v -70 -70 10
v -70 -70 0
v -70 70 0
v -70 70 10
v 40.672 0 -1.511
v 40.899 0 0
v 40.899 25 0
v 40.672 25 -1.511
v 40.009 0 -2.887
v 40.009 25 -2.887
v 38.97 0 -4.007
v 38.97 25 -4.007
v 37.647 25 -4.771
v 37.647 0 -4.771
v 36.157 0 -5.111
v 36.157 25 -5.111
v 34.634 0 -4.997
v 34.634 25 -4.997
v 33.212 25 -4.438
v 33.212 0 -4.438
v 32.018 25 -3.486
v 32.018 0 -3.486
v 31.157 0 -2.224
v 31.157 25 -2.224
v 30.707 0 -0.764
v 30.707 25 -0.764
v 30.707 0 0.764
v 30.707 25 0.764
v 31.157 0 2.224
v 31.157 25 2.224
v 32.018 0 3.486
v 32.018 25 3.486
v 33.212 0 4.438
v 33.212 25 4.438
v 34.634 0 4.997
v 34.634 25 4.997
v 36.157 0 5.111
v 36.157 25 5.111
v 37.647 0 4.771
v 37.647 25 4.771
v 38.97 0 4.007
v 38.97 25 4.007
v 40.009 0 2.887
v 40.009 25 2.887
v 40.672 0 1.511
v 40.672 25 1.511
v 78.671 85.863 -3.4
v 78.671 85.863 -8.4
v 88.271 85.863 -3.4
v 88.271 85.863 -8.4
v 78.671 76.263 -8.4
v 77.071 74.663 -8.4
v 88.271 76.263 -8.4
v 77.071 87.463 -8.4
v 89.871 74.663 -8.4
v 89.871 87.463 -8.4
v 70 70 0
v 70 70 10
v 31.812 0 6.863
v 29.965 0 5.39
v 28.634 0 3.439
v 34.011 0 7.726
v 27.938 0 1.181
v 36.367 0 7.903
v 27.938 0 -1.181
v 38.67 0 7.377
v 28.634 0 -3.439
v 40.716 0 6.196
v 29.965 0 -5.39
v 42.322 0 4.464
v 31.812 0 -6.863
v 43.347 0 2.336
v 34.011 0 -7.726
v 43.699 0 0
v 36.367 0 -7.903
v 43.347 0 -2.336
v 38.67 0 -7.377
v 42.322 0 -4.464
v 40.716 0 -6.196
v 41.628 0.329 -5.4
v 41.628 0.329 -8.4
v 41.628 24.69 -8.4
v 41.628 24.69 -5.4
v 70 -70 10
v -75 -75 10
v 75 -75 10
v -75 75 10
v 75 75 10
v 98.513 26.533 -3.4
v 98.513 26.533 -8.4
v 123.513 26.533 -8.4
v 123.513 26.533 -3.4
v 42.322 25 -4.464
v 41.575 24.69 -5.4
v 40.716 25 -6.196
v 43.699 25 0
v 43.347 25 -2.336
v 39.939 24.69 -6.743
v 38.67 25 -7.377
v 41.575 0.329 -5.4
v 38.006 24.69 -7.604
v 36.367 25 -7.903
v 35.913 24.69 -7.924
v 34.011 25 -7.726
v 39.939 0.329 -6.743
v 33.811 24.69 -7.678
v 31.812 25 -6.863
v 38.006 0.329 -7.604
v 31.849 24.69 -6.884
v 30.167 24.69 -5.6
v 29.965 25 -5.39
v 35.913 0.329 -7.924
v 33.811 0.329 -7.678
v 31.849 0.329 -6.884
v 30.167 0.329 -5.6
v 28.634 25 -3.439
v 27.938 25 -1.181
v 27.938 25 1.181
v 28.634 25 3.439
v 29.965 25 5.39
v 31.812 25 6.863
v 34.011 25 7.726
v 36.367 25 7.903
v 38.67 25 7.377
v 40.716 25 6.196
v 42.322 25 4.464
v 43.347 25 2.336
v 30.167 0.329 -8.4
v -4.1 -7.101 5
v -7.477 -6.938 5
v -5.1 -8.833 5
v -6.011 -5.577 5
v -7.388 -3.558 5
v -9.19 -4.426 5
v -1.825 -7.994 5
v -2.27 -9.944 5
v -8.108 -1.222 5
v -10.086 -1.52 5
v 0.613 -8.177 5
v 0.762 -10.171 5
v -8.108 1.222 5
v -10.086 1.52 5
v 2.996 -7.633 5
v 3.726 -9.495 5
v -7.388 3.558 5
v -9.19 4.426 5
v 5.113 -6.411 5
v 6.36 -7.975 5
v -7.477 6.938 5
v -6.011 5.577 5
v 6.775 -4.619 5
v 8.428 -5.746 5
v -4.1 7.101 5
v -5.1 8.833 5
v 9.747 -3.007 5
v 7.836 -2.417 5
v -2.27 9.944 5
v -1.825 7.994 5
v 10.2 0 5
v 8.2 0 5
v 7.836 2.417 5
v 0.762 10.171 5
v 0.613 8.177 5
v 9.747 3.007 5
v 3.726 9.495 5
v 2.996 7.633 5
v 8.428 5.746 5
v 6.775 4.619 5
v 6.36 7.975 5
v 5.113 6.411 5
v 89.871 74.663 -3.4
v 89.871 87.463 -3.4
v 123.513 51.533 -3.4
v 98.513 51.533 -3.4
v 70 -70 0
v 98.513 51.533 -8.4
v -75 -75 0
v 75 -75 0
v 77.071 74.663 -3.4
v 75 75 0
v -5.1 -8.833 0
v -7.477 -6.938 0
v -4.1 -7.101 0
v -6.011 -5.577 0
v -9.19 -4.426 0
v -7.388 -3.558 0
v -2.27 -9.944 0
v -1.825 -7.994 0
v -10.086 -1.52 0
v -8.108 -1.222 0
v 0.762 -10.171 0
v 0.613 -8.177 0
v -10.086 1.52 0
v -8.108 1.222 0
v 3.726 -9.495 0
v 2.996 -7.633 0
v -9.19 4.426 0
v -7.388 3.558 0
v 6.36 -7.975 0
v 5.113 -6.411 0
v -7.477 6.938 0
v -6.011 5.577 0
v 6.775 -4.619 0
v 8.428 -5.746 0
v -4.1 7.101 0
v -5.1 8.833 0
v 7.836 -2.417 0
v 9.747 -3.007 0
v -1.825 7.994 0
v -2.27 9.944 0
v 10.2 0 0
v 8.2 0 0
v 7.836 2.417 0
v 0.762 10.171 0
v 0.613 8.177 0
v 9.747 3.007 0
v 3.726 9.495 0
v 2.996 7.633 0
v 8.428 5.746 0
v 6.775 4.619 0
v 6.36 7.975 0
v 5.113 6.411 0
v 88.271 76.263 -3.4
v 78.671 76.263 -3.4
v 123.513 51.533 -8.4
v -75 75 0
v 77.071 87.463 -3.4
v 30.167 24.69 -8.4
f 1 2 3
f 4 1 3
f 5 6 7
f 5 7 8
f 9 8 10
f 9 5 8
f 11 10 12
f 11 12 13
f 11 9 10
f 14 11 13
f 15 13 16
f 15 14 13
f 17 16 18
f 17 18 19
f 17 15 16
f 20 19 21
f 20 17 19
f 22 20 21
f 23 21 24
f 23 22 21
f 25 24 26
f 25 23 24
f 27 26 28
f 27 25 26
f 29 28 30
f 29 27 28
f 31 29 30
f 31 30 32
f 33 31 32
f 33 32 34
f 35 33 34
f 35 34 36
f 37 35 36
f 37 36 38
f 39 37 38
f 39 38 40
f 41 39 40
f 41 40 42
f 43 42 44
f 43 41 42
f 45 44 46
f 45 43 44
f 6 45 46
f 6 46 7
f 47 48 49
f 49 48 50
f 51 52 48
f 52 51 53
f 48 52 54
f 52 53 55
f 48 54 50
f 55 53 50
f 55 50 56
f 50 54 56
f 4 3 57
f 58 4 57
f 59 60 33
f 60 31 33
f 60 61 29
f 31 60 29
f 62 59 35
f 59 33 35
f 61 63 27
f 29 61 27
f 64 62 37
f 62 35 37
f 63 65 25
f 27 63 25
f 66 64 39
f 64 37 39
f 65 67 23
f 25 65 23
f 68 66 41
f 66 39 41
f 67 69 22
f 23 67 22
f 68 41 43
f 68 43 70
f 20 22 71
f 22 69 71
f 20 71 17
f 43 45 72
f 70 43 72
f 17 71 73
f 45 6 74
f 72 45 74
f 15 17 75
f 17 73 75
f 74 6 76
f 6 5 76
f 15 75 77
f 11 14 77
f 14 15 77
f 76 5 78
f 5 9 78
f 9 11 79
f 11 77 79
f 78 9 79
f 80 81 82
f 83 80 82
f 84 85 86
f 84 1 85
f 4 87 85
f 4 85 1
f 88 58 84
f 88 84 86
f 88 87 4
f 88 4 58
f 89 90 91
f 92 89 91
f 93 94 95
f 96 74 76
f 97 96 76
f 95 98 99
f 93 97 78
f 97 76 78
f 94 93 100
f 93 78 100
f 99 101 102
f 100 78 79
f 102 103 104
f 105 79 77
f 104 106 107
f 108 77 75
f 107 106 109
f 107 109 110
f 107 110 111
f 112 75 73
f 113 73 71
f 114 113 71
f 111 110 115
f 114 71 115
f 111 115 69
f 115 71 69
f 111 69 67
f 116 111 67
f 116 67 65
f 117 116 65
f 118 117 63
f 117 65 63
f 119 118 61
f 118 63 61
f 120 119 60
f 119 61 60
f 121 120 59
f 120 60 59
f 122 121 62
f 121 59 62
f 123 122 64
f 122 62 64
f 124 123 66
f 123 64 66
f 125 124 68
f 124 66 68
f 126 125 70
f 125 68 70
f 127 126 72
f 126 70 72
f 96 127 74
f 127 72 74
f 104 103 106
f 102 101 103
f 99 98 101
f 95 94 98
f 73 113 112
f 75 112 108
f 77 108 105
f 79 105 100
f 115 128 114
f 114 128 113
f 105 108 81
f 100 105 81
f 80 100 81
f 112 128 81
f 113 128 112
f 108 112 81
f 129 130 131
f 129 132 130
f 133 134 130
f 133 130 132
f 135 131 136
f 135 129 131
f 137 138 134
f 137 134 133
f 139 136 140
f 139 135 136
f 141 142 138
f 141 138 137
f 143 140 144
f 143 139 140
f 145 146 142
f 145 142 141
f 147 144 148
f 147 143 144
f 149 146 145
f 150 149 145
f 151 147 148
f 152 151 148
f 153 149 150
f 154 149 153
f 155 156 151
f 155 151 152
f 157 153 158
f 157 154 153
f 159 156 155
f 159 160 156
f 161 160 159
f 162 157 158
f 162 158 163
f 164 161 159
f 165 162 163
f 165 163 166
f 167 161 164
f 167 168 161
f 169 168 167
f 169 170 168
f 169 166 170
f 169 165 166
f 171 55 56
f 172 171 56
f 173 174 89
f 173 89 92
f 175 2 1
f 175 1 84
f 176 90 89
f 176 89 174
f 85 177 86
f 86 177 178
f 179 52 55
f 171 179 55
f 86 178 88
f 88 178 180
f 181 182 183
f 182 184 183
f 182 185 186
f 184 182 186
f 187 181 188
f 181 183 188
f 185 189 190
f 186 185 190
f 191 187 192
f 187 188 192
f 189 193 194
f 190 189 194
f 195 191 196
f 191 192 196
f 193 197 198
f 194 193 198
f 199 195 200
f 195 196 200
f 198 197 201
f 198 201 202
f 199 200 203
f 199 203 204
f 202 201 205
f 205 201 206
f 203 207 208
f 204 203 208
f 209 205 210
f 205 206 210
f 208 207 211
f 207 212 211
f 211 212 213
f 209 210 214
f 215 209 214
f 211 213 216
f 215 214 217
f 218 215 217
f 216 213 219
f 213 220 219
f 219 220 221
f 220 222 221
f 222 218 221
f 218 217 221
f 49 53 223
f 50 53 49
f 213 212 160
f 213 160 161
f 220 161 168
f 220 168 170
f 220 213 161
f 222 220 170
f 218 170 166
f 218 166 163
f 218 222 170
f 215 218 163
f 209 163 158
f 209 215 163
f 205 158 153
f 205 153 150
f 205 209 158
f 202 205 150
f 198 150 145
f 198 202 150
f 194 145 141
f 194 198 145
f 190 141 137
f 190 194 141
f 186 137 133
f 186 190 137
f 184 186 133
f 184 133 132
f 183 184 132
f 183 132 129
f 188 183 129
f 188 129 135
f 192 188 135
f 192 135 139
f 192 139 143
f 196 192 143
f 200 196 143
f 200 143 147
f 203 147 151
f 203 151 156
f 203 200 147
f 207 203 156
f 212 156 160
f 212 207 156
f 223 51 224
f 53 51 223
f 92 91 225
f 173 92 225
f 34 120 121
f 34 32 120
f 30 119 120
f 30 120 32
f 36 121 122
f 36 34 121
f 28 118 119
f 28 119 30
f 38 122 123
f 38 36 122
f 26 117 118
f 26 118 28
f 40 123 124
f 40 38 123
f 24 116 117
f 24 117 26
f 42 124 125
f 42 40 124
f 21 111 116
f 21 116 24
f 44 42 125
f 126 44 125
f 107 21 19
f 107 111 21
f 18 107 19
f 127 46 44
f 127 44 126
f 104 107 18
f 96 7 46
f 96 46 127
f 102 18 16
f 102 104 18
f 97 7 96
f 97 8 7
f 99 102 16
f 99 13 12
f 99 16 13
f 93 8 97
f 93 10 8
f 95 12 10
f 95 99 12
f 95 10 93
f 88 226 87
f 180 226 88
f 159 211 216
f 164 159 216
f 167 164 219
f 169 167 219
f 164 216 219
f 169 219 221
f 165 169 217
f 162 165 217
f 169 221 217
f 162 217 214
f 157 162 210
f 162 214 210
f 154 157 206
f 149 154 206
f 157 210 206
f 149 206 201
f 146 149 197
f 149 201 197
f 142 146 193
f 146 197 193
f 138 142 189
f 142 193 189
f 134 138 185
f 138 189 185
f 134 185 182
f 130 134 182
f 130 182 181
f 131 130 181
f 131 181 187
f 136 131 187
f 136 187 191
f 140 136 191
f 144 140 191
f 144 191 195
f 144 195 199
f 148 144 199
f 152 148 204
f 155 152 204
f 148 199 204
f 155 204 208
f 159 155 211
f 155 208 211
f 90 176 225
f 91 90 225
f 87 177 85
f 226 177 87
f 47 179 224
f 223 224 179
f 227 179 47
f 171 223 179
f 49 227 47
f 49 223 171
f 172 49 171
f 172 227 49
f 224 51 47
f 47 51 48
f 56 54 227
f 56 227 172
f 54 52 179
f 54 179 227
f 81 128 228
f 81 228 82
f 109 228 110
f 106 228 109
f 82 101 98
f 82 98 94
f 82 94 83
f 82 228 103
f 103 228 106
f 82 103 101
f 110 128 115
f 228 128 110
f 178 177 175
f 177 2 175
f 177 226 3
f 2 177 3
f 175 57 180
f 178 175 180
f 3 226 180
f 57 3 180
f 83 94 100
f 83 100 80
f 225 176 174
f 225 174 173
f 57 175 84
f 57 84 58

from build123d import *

# Parameters (mm, degrees)
F0_W     = 150
F0_H     = 150
F0_W_2   = 140
F0_H_2   = 140
F1_DEPTH = 10
F0_R     = 10.2
F0_R_2   = 8.2
F2_DEPTH = 5
F0_R_3   = 7.925
F0_R_4   = 5.125
F3_DEPTH = 25
F4_ANGLE = 90
F6_W     = 11.461680755
F6_H     = 24.3612193444
F7_DEPTH = 3
F8_W     = 12.8
F8_H     = 12.8
F8_W_2   = 9.6
F8_H_2   = 9.6
F9_DEPTH = 5
F8_W_3   = 25
F8_H_3   = 25


with BuildPart() as f1:
    # F0 (on Top) → F1 (new body)
    with BuildSketch(Plane.XY):
        Rectangle(F0_W, F0_H)
        Rectangle(F0_W_2, F0_H_2, mode=Mode.SUBTRACT)
    extrude(amount=F1_DEPTH)


with BuildPart() as f2:
    # F0 (on Top) → F2 (new body)
    with BuildSketch(Plane.XY):
        Circle(F0_R)
        Circle(F0_R_2, mode=Mode.SUBTRACT)
    extrude(amount=F2_DEPTH)


with BuildPart() as f3:
    # F0 (on Top) → F3 (new body)
    with BuildSketch(Plane.XY):
        with Locations((35.7744656503, 0)):
            Circle(F0_R_3)
        with Locations((35.7744656503, 0)):
            Circle(F0_R_4, mode=Mode.SUBTRACT)
    extrude(amount=F3_DEPTH)


with BuildPart() as f3_1:
    # F4: moved
    add(f3.part.rotate(Axis((-24.074178189, 0, 0), (-1, 0, 0)), F4_ANGLE))

    # F6 (on offset) → F7 (join)
    with BuildSketch(Plane.XY.offset(-8.4)):
        with Locations((35.897471942, 12.509433509)):
            Rectangle(F6_W, F6_H)
    extrude(amount=F7_DEPTH)


with BuildPart() as f9:
    # F8 (on offset) → F9 (new body)
    with BuildSketch(Plane.XY.offset(-8.4)):
        with Locations((83.470857326, 81.062909615)):
            Rectangle(F8_W, F8_H)
        with Locations((83.470857326, 81.062909615)):
            Rectangle(F8_W_2, F8_H_2, mode=Mode.SUBTRACT)
    extrude(amount=F9_DEPTH)


with BuildPart() as f9b:
    # F8 (on offset) → F9, piece 2 (new body)
    with BuildSketch(Plane.XY.offset(-8.4)):
        with Locations((111.0130876303, 39.0334695578)):
            Rectangle(F8_W_3, F8_H_3)
    extrude(amount=F9_DEPTH)


solid = Compound([f1.part, f2.part, f3_1.part, f9.part, f9b.part])
